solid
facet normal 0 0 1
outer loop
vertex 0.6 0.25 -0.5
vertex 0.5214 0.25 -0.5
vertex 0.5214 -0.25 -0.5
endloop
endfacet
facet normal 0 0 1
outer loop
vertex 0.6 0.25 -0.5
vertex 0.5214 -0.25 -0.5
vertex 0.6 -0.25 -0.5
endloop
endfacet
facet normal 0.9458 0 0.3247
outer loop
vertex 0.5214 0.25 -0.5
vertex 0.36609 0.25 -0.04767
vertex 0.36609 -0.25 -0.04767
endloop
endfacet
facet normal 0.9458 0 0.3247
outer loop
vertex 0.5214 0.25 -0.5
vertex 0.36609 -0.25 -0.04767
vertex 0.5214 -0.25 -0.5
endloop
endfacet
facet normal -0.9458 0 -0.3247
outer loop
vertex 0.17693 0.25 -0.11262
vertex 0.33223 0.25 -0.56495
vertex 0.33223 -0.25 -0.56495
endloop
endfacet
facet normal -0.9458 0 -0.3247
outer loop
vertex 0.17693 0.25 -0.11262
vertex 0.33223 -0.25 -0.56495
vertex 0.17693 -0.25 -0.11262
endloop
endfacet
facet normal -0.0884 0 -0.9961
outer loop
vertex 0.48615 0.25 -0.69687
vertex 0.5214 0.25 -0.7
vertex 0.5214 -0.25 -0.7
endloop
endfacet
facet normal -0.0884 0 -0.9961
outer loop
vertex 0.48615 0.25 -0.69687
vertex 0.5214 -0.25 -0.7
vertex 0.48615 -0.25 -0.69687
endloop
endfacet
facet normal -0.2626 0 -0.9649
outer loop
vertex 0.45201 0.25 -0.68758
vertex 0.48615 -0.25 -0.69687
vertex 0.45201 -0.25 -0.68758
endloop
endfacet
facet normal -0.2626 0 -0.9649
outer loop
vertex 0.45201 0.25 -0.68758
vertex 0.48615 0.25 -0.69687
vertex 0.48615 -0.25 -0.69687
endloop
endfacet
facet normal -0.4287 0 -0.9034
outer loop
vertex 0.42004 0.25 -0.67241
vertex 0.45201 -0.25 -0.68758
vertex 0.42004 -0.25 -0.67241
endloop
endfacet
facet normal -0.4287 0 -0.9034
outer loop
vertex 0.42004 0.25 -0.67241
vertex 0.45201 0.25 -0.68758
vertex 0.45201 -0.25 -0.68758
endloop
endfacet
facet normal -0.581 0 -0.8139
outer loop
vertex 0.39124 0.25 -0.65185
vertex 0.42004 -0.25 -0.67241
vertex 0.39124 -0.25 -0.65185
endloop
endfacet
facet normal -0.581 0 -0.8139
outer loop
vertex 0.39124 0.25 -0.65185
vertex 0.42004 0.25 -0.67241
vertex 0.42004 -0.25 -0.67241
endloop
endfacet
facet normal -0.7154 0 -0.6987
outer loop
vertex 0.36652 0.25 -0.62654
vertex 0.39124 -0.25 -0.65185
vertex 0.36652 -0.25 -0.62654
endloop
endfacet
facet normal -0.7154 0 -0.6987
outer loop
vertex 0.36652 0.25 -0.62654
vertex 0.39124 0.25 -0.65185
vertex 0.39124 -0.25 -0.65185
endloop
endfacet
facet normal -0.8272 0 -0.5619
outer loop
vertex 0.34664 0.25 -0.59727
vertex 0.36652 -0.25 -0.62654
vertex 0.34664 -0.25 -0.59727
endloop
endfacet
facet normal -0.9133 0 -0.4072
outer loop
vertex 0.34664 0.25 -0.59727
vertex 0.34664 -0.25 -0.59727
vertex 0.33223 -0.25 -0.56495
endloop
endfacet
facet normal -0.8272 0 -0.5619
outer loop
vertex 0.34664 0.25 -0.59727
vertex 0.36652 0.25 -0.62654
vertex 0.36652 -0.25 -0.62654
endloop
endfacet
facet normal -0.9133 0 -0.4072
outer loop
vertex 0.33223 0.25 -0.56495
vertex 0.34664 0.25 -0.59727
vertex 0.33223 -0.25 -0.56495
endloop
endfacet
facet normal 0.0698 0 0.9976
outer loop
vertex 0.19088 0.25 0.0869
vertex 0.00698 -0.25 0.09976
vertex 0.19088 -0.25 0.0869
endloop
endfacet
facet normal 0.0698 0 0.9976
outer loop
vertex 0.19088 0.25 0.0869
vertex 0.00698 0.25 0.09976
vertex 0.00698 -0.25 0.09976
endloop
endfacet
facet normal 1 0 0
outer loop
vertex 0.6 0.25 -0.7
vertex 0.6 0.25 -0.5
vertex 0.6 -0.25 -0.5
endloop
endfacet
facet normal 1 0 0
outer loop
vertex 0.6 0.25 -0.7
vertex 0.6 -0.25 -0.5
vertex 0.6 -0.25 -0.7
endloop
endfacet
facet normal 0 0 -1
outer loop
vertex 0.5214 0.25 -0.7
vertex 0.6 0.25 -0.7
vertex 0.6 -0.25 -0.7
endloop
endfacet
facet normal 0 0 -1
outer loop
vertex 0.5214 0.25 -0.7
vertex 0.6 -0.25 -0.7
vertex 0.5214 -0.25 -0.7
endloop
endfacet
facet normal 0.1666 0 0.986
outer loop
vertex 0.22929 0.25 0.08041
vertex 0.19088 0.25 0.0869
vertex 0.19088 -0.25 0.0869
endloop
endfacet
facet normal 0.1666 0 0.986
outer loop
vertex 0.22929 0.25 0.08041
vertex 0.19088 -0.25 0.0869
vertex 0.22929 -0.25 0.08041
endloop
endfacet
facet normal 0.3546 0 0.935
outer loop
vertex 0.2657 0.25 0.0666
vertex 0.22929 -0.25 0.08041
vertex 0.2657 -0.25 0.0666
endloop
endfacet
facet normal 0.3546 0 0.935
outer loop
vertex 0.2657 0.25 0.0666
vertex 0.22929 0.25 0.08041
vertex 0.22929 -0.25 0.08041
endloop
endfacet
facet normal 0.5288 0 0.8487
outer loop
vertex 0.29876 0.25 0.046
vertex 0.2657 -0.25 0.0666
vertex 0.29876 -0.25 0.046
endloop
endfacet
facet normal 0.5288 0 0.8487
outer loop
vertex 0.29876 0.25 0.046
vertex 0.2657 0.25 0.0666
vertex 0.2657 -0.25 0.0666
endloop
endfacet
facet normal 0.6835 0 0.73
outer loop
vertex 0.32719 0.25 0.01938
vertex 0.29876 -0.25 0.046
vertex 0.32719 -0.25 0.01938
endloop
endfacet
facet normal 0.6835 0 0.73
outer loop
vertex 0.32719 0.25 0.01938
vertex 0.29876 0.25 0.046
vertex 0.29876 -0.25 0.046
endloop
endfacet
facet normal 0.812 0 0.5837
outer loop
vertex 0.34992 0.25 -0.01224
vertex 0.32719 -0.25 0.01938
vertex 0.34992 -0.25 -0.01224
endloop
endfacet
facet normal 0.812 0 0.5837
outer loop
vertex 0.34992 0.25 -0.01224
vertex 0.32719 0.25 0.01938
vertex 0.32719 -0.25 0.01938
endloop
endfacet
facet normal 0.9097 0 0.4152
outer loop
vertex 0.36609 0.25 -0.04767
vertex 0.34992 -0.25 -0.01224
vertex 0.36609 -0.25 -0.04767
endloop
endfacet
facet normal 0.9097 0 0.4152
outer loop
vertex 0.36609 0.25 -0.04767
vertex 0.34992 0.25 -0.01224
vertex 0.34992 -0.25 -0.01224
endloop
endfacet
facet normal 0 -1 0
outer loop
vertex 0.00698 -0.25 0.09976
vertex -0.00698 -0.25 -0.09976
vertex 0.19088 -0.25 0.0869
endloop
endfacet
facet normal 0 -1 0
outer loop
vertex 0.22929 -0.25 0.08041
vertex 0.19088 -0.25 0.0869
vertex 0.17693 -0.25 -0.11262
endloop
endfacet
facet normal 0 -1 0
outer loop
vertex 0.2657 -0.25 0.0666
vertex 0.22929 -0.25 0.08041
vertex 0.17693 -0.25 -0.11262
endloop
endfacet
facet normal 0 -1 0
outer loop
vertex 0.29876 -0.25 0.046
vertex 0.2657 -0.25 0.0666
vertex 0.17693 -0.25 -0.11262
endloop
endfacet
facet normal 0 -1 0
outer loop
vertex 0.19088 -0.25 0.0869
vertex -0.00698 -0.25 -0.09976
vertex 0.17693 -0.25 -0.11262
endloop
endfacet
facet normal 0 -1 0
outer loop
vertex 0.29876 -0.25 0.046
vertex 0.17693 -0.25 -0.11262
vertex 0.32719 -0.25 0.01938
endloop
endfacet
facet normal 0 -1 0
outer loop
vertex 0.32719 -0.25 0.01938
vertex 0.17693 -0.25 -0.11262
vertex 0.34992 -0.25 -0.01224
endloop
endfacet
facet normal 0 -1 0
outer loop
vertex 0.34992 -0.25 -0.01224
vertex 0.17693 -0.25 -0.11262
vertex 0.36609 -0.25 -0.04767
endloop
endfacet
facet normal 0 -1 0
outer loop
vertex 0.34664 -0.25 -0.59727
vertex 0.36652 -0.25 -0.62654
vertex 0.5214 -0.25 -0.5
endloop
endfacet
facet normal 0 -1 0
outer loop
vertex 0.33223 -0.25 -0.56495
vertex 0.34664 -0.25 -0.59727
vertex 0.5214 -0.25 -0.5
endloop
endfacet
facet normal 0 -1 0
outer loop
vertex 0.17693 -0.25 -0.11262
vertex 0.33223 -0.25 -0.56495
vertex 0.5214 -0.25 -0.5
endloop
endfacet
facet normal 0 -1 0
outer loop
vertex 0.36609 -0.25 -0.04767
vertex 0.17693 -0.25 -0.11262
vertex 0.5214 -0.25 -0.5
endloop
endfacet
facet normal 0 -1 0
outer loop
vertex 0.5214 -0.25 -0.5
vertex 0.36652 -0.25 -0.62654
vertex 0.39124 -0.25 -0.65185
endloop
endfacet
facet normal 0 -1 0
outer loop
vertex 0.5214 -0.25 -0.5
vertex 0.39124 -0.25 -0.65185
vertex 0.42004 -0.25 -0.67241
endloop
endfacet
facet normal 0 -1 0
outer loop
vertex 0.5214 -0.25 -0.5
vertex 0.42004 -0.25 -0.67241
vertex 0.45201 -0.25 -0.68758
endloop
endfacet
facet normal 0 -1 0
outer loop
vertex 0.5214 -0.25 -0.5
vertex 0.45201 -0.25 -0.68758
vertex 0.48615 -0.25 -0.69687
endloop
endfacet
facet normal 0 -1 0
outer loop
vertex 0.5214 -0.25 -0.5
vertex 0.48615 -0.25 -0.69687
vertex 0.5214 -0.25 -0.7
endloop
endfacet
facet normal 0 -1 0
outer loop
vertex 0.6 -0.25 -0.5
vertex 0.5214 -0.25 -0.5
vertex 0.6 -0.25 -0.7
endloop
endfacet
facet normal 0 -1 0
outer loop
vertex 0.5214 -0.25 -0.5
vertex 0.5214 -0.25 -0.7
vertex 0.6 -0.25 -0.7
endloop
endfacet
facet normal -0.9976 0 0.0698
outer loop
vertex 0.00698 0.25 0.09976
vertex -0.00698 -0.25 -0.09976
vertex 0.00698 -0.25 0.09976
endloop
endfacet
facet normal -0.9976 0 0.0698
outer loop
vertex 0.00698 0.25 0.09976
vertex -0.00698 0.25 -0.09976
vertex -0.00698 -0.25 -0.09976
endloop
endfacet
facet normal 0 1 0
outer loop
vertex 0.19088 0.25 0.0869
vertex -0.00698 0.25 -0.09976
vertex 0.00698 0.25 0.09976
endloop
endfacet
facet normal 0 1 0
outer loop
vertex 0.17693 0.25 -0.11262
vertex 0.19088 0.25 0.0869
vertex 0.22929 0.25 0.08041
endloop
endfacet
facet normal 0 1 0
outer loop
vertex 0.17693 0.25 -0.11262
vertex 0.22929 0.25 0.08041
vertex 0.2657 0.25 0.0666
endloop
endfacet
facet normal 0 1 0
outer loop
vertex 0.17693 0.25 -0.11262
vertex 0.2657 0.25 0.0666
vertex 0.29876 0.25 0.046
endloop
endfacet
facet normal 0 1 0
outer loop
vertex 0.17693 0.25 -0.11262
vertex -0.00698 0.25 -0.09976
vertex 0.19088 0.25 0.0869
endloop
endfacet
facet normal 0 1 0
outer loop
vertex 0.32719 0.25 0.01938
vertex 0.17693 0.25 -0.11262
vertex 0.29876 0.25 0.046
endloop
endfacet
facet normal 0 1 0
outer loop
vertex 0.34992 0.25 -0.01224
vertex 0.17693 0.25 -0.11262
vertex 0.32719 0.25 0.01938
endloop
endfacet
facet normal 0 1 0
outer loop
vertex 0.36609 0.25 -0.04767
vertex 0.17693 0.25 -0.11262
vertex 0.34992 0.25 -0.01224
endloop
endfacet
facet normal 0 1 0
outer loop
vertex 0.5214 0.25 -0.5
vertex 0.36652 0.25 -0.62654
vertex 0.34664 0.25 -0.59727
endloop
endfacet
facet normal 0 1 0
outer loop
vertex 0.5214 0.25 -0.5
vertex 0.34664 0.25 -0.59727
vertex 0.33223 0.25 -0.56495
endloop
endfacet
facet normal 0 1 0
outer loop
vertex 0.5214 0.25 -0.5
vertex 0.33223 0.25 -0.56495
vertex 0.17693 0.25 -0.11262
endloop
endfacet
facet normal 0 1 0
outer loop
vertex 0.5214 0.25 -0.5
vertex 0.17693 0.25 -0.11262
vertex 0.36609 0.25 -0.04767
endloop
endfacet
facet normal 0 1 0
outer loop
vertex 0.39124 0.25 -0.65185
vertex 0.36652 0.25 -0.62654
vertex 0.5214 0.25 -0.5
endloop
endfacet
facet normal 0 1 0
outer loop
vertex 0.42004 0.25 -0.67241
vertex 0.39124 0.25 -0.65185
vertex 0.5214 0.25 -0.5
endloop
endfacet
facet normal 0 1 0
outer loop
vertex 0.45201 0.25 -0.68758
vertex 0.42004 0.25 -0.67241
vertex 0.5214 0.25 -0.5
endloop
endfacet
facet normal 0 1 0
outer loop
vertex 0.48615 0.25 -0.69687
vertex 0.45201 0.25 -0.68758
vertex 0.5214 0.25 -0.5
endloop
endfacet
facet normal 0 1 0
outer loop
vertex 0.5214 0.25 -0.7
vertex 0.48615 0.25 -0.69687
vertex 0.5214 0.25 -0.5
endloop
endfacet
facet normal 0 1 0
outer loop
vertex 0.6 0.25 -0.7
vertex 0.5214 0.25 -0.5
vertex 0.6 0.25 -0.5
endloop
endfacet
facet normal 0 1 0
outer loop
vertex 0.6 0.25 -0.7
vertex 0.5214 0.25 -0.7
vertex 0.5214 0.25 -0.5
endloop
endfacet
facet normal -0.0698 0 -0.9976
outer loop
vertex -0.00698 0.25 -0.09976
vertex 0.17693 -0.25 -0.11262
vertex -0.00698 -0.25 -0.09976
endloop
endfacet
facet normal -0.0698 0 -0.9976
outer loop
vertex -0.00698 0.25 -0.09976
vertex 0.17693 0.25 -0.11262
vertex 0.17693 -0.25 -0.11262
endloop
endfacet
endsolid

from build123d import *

# Parameters (mm, degrees)
BOSS_EXTRUDE1_DEPTH = 0.25


with BuildPart() as part:
    # Sketch2 → Boss-Extrude1 (new, symmetric)
    with BuildSketch(Plane(origin=(0, 0, 0), x_dir=(1, 0, 0), z_dir=(0, 1, 0))):
        with BuildLine():
            Line((0.006975647, -0.099756405), (0.190884751, -0.086896228))
            ThreePointArc((0.190884751, -0.086896228), (0.298756023, -0.046000133), (0.366094789, 0.047670525))
            Line((0.366094789, 0.047670525), (0.521396168, 0.5))
            Line((0.521396168, 0.5), (0.6, 0.5))
            Line((0.6, 0.5), (0.6, 0.7))
            Line((0.6, 0.7), (0.521396168, 0.7))
            ThreePointArc((0.521396168, 0.7), (0.405183457, 0.662771637), (0.332234836, 0.564946057))
            Line((0.332234836, 0.564946057), (0.176933457, 0.112616582))
            Line((0.176933457, 0.112616582), (-0.006975647, 0.099756405))
            Line((-0.006975647, 0.099756405), (0.006975647, -0.099756405))
        make_face()
    extrude(amount=BOSS_EXTRUDE1_DEPTH, both=True)


solid = part.part
